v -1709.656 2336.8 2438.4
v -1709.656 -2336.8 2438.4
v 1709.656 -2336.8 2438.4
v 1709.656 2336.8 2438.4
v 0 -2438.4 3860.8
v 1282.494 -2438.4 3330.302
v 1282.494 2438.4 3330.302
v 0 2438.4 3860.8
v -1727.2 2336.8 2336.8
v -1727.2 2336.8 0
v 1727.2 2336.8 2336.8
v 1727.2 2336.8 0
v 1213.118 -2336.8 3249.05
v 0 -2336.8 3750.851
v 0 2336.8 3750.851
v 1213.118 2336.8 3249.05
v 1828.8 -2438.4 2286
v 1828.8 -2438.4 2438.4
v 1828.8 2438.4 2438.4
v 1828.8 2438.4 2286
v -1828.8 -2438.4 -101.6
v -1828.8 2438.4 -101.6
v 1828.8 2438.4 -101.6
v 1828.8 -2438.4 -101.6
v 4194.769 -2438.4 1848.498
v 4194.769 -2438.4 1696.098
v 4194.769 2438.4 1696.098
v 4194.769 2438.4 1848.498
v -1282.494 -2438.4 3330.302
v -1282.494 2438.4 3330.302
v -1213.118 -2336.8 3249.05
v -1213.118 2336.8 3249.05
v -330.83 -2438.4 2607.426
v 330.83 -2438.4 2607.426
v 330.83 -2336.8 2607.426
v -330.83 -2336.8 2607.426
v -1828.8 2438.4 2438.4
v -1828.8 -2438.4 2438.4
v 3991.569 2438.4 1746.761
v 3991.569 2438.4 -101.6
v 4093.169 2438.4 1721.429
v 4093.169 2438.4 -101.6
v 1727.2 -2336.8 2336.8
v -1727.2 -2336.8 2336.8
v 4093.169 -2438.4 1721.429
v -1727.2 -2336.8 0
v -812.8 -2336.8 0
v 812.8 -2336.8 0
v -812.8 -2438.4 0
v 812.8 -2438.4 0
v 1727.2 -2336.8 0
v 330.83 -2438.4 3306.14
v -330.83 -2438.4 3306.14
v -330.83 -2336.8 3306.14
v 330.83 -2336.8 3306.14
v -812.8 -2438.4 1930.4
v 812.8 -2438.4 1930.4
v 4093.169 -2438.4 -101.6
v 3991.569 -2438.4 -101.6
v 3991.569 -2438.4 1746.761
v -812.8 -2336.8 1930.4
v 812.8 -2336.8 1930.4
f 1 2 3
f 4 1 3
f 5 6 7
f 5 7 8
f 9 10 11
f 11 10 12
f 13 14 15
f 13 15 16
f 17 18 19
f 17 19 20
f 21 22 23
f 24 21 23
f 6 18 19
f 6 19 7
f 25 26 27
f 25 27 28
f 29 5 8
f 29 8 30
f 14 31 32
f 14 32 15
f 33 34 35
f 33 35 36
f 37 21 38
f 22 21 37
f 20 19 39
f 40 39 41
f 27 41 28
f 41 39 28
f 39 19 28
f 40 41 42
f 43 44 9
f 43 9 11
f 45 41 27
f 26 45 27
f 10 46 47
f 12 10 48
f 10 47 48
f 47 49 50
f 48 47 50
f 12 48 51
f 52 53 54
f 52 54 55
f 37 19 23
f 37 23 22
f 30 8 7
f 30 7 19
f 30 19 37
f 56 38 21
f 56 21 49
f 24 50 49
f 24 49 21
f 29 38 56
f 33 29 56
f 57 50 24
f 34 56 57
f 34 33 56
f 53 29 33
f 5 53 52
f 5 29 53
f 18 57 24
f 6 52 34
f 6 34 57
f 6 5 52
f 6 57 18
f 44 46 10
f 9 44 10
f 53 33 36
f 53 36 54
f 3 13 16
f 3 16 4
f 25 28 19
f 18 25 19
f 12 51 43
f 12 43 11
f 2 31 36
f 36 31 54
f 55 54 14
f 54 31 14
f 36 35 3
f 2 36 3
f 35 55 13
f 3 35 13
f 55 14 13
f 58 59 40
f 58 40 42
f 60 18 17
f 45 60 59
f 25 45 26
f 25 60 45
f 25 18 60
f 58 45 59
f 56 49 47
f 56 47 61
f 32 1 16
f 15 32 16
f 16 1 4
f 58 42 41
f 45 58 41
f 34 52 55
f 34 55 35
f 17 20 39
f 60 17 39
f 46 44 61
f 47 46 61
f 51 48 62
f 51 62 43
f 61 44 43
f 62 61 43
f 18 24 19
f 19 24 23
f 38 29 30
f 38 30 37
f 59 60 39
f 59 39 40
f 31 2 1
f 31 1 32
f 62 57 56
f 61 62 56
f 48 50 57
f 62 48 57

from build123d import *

# Parameters (mm, degrees)
F0_W      = 3657.6
F0_H      = 4876.8
F1_DEPTH  = 101.6
F2_W      = 3657.6
F2_H      = 4876.8
F2_W_2    = 3454.4
F2_H_2    = 4673.6
F3_DEPTH  = 2438.4
F4_W      = 812.8
F4_H      = 1930.4
F5_DEPTH  = 101.6
F7_DEPTH  = 4876.8
F9_DEPTH  = 101.6
F11_DEPTH = 101.6
F12_W     = 3657.6
F12_H     = 101.6
F13_DEPTH = 4876.8
F15_DEPTH = 4876.8
F18_DEPTH = 4876.8


with BuildPart() as f1:
    # F0 (on Top) → F1 (new body)
    with BuildSketch(Plane.XY):
        Rectangle(F0_W, F0_H)
    extrude(amount=-F1_DEPTH)

    # F2 (on face) → F3 (join)
    with BuildSketch(Plane.XY):
        Rectangle(F2_W, F2_H)
        Rectangle(F2_W_2, F2_H_2, mode=Mode.SUBTRACT)
    extrude(amount=F3_DEPTH)

    # F4 (on face) → F5 (cut)
    with BuildSketch(Plane.XZ.offset(2438.4)):
        with Locations((-406.4, 965.2)):
            Rectangle(F4_W, F4_H)
        with Locations((406.4, 965.2)):
            Rectangle(F4_W, F4_H)
    extrude(amount=-F5_DEPTH, mode=Mode.SUBTRACT)

    # F6 (on face) → F7 (join)
    with BuildSketch(Plane.XZ.offset(2438.4)):
        Polygon((-1282.4944257736, 3330.3015232086), (-1828.8, 2438.4), (-1709.655725252, 2438.4), (-1213.1183690764, 3249.0496532277), (0, 3750.851013163), (1213.1183690764, 3249.0496532277), (1709.655725252, 2438.4), (1828.8, 2438.4), (1282.4944257736, 3330.3015232086), (0, 3860.8), align=None)
    extrude(amount=-F7_DEPTH)

    # F8 (on face) → F9 (join)
    with BuildSketch(Plane.XZ.offset(2438.4)):
        Polygon((-1213.1183690764, 3249.0496532277), (-1709.655725252, 2438.4), (1709.655725252, 2438.4), (1213.1183690764, 3249.0496532277), (330.8301568031, 3306.1397075653), (330.8301568031, 2607.426404953), (-330.8301568031, 2607.426404953), (-330.8301568031, 3306.1397075653), align=None)
        Polygon((0, 3750.851013163), (-1213.1183690764, 3249.0496532277), (-330.8301568031, 3306.1397075653), (330.8301568031, 3306.1397075653), (1213.1183690764, 3249.0496532277), align=None)
    extrude(amount=-F9_DEPTH)

    # F10 (on face) → F11 (join)
    with BuildSketch(Plane(origin=(0, 2438.4, 0), x_dir=(-1, 0, 0), z_dir=(0, 1, 0))):
        Polygon((-1213.1183690764, 3249.0496532277), (-1709.655725252, 2438.4), (1709.655725252, 2438.4), (1213.1183690764, 3249.0496532277), (0, 3750.851013163), align=None)
    extrude(amount=-F11_DEPTH)

    # F12 (on face) → F13 (join)
    with BuildSketch(Plane.XZ.offset(2438.4)):
        with Locations((0, 2387.6)):
            Rectangle(F12_W, F12_H)
    extrude(amount=-F13_DEPTH)


with BuildPart() as f15:
    # F14 (on face) → F15 (new body)
    with BuildSketch(Plane.XZ.offset(2438.4)):
        Polygon((4194.7690989514, 1848.4976497698), (1828.8, 2438.4), (1828.8, 2286), (4194.7690989514, 1696.0976497698), align=None)
    extrude(amount=-F15_DEPTH)


with BuildPart() as f18:
    # F17 (on face) → F18 (new body)
    with BuildSketch(Plane.XZ.offset(2438.4)):
        Polygon((4194.7690989514, 1848.4976497698), (1828.8, 2438.4), (1828.8, 2286), (3991.5690989514, 1746.7610999475), (4093.1690989514, 1721.4293748586), (4194.7690989514, 1696.0976497698), align=None)
        Polygon((4093.1690989514, 1721.4293748586), (3991.5690989514, 1746.7610999475), (3991.5690989514, -101.6), (4093.1690989514, -101.6), align=None)
    extrude(amount=-F18_DEPTH)


solid = Compound([f1.part, f18.part])
